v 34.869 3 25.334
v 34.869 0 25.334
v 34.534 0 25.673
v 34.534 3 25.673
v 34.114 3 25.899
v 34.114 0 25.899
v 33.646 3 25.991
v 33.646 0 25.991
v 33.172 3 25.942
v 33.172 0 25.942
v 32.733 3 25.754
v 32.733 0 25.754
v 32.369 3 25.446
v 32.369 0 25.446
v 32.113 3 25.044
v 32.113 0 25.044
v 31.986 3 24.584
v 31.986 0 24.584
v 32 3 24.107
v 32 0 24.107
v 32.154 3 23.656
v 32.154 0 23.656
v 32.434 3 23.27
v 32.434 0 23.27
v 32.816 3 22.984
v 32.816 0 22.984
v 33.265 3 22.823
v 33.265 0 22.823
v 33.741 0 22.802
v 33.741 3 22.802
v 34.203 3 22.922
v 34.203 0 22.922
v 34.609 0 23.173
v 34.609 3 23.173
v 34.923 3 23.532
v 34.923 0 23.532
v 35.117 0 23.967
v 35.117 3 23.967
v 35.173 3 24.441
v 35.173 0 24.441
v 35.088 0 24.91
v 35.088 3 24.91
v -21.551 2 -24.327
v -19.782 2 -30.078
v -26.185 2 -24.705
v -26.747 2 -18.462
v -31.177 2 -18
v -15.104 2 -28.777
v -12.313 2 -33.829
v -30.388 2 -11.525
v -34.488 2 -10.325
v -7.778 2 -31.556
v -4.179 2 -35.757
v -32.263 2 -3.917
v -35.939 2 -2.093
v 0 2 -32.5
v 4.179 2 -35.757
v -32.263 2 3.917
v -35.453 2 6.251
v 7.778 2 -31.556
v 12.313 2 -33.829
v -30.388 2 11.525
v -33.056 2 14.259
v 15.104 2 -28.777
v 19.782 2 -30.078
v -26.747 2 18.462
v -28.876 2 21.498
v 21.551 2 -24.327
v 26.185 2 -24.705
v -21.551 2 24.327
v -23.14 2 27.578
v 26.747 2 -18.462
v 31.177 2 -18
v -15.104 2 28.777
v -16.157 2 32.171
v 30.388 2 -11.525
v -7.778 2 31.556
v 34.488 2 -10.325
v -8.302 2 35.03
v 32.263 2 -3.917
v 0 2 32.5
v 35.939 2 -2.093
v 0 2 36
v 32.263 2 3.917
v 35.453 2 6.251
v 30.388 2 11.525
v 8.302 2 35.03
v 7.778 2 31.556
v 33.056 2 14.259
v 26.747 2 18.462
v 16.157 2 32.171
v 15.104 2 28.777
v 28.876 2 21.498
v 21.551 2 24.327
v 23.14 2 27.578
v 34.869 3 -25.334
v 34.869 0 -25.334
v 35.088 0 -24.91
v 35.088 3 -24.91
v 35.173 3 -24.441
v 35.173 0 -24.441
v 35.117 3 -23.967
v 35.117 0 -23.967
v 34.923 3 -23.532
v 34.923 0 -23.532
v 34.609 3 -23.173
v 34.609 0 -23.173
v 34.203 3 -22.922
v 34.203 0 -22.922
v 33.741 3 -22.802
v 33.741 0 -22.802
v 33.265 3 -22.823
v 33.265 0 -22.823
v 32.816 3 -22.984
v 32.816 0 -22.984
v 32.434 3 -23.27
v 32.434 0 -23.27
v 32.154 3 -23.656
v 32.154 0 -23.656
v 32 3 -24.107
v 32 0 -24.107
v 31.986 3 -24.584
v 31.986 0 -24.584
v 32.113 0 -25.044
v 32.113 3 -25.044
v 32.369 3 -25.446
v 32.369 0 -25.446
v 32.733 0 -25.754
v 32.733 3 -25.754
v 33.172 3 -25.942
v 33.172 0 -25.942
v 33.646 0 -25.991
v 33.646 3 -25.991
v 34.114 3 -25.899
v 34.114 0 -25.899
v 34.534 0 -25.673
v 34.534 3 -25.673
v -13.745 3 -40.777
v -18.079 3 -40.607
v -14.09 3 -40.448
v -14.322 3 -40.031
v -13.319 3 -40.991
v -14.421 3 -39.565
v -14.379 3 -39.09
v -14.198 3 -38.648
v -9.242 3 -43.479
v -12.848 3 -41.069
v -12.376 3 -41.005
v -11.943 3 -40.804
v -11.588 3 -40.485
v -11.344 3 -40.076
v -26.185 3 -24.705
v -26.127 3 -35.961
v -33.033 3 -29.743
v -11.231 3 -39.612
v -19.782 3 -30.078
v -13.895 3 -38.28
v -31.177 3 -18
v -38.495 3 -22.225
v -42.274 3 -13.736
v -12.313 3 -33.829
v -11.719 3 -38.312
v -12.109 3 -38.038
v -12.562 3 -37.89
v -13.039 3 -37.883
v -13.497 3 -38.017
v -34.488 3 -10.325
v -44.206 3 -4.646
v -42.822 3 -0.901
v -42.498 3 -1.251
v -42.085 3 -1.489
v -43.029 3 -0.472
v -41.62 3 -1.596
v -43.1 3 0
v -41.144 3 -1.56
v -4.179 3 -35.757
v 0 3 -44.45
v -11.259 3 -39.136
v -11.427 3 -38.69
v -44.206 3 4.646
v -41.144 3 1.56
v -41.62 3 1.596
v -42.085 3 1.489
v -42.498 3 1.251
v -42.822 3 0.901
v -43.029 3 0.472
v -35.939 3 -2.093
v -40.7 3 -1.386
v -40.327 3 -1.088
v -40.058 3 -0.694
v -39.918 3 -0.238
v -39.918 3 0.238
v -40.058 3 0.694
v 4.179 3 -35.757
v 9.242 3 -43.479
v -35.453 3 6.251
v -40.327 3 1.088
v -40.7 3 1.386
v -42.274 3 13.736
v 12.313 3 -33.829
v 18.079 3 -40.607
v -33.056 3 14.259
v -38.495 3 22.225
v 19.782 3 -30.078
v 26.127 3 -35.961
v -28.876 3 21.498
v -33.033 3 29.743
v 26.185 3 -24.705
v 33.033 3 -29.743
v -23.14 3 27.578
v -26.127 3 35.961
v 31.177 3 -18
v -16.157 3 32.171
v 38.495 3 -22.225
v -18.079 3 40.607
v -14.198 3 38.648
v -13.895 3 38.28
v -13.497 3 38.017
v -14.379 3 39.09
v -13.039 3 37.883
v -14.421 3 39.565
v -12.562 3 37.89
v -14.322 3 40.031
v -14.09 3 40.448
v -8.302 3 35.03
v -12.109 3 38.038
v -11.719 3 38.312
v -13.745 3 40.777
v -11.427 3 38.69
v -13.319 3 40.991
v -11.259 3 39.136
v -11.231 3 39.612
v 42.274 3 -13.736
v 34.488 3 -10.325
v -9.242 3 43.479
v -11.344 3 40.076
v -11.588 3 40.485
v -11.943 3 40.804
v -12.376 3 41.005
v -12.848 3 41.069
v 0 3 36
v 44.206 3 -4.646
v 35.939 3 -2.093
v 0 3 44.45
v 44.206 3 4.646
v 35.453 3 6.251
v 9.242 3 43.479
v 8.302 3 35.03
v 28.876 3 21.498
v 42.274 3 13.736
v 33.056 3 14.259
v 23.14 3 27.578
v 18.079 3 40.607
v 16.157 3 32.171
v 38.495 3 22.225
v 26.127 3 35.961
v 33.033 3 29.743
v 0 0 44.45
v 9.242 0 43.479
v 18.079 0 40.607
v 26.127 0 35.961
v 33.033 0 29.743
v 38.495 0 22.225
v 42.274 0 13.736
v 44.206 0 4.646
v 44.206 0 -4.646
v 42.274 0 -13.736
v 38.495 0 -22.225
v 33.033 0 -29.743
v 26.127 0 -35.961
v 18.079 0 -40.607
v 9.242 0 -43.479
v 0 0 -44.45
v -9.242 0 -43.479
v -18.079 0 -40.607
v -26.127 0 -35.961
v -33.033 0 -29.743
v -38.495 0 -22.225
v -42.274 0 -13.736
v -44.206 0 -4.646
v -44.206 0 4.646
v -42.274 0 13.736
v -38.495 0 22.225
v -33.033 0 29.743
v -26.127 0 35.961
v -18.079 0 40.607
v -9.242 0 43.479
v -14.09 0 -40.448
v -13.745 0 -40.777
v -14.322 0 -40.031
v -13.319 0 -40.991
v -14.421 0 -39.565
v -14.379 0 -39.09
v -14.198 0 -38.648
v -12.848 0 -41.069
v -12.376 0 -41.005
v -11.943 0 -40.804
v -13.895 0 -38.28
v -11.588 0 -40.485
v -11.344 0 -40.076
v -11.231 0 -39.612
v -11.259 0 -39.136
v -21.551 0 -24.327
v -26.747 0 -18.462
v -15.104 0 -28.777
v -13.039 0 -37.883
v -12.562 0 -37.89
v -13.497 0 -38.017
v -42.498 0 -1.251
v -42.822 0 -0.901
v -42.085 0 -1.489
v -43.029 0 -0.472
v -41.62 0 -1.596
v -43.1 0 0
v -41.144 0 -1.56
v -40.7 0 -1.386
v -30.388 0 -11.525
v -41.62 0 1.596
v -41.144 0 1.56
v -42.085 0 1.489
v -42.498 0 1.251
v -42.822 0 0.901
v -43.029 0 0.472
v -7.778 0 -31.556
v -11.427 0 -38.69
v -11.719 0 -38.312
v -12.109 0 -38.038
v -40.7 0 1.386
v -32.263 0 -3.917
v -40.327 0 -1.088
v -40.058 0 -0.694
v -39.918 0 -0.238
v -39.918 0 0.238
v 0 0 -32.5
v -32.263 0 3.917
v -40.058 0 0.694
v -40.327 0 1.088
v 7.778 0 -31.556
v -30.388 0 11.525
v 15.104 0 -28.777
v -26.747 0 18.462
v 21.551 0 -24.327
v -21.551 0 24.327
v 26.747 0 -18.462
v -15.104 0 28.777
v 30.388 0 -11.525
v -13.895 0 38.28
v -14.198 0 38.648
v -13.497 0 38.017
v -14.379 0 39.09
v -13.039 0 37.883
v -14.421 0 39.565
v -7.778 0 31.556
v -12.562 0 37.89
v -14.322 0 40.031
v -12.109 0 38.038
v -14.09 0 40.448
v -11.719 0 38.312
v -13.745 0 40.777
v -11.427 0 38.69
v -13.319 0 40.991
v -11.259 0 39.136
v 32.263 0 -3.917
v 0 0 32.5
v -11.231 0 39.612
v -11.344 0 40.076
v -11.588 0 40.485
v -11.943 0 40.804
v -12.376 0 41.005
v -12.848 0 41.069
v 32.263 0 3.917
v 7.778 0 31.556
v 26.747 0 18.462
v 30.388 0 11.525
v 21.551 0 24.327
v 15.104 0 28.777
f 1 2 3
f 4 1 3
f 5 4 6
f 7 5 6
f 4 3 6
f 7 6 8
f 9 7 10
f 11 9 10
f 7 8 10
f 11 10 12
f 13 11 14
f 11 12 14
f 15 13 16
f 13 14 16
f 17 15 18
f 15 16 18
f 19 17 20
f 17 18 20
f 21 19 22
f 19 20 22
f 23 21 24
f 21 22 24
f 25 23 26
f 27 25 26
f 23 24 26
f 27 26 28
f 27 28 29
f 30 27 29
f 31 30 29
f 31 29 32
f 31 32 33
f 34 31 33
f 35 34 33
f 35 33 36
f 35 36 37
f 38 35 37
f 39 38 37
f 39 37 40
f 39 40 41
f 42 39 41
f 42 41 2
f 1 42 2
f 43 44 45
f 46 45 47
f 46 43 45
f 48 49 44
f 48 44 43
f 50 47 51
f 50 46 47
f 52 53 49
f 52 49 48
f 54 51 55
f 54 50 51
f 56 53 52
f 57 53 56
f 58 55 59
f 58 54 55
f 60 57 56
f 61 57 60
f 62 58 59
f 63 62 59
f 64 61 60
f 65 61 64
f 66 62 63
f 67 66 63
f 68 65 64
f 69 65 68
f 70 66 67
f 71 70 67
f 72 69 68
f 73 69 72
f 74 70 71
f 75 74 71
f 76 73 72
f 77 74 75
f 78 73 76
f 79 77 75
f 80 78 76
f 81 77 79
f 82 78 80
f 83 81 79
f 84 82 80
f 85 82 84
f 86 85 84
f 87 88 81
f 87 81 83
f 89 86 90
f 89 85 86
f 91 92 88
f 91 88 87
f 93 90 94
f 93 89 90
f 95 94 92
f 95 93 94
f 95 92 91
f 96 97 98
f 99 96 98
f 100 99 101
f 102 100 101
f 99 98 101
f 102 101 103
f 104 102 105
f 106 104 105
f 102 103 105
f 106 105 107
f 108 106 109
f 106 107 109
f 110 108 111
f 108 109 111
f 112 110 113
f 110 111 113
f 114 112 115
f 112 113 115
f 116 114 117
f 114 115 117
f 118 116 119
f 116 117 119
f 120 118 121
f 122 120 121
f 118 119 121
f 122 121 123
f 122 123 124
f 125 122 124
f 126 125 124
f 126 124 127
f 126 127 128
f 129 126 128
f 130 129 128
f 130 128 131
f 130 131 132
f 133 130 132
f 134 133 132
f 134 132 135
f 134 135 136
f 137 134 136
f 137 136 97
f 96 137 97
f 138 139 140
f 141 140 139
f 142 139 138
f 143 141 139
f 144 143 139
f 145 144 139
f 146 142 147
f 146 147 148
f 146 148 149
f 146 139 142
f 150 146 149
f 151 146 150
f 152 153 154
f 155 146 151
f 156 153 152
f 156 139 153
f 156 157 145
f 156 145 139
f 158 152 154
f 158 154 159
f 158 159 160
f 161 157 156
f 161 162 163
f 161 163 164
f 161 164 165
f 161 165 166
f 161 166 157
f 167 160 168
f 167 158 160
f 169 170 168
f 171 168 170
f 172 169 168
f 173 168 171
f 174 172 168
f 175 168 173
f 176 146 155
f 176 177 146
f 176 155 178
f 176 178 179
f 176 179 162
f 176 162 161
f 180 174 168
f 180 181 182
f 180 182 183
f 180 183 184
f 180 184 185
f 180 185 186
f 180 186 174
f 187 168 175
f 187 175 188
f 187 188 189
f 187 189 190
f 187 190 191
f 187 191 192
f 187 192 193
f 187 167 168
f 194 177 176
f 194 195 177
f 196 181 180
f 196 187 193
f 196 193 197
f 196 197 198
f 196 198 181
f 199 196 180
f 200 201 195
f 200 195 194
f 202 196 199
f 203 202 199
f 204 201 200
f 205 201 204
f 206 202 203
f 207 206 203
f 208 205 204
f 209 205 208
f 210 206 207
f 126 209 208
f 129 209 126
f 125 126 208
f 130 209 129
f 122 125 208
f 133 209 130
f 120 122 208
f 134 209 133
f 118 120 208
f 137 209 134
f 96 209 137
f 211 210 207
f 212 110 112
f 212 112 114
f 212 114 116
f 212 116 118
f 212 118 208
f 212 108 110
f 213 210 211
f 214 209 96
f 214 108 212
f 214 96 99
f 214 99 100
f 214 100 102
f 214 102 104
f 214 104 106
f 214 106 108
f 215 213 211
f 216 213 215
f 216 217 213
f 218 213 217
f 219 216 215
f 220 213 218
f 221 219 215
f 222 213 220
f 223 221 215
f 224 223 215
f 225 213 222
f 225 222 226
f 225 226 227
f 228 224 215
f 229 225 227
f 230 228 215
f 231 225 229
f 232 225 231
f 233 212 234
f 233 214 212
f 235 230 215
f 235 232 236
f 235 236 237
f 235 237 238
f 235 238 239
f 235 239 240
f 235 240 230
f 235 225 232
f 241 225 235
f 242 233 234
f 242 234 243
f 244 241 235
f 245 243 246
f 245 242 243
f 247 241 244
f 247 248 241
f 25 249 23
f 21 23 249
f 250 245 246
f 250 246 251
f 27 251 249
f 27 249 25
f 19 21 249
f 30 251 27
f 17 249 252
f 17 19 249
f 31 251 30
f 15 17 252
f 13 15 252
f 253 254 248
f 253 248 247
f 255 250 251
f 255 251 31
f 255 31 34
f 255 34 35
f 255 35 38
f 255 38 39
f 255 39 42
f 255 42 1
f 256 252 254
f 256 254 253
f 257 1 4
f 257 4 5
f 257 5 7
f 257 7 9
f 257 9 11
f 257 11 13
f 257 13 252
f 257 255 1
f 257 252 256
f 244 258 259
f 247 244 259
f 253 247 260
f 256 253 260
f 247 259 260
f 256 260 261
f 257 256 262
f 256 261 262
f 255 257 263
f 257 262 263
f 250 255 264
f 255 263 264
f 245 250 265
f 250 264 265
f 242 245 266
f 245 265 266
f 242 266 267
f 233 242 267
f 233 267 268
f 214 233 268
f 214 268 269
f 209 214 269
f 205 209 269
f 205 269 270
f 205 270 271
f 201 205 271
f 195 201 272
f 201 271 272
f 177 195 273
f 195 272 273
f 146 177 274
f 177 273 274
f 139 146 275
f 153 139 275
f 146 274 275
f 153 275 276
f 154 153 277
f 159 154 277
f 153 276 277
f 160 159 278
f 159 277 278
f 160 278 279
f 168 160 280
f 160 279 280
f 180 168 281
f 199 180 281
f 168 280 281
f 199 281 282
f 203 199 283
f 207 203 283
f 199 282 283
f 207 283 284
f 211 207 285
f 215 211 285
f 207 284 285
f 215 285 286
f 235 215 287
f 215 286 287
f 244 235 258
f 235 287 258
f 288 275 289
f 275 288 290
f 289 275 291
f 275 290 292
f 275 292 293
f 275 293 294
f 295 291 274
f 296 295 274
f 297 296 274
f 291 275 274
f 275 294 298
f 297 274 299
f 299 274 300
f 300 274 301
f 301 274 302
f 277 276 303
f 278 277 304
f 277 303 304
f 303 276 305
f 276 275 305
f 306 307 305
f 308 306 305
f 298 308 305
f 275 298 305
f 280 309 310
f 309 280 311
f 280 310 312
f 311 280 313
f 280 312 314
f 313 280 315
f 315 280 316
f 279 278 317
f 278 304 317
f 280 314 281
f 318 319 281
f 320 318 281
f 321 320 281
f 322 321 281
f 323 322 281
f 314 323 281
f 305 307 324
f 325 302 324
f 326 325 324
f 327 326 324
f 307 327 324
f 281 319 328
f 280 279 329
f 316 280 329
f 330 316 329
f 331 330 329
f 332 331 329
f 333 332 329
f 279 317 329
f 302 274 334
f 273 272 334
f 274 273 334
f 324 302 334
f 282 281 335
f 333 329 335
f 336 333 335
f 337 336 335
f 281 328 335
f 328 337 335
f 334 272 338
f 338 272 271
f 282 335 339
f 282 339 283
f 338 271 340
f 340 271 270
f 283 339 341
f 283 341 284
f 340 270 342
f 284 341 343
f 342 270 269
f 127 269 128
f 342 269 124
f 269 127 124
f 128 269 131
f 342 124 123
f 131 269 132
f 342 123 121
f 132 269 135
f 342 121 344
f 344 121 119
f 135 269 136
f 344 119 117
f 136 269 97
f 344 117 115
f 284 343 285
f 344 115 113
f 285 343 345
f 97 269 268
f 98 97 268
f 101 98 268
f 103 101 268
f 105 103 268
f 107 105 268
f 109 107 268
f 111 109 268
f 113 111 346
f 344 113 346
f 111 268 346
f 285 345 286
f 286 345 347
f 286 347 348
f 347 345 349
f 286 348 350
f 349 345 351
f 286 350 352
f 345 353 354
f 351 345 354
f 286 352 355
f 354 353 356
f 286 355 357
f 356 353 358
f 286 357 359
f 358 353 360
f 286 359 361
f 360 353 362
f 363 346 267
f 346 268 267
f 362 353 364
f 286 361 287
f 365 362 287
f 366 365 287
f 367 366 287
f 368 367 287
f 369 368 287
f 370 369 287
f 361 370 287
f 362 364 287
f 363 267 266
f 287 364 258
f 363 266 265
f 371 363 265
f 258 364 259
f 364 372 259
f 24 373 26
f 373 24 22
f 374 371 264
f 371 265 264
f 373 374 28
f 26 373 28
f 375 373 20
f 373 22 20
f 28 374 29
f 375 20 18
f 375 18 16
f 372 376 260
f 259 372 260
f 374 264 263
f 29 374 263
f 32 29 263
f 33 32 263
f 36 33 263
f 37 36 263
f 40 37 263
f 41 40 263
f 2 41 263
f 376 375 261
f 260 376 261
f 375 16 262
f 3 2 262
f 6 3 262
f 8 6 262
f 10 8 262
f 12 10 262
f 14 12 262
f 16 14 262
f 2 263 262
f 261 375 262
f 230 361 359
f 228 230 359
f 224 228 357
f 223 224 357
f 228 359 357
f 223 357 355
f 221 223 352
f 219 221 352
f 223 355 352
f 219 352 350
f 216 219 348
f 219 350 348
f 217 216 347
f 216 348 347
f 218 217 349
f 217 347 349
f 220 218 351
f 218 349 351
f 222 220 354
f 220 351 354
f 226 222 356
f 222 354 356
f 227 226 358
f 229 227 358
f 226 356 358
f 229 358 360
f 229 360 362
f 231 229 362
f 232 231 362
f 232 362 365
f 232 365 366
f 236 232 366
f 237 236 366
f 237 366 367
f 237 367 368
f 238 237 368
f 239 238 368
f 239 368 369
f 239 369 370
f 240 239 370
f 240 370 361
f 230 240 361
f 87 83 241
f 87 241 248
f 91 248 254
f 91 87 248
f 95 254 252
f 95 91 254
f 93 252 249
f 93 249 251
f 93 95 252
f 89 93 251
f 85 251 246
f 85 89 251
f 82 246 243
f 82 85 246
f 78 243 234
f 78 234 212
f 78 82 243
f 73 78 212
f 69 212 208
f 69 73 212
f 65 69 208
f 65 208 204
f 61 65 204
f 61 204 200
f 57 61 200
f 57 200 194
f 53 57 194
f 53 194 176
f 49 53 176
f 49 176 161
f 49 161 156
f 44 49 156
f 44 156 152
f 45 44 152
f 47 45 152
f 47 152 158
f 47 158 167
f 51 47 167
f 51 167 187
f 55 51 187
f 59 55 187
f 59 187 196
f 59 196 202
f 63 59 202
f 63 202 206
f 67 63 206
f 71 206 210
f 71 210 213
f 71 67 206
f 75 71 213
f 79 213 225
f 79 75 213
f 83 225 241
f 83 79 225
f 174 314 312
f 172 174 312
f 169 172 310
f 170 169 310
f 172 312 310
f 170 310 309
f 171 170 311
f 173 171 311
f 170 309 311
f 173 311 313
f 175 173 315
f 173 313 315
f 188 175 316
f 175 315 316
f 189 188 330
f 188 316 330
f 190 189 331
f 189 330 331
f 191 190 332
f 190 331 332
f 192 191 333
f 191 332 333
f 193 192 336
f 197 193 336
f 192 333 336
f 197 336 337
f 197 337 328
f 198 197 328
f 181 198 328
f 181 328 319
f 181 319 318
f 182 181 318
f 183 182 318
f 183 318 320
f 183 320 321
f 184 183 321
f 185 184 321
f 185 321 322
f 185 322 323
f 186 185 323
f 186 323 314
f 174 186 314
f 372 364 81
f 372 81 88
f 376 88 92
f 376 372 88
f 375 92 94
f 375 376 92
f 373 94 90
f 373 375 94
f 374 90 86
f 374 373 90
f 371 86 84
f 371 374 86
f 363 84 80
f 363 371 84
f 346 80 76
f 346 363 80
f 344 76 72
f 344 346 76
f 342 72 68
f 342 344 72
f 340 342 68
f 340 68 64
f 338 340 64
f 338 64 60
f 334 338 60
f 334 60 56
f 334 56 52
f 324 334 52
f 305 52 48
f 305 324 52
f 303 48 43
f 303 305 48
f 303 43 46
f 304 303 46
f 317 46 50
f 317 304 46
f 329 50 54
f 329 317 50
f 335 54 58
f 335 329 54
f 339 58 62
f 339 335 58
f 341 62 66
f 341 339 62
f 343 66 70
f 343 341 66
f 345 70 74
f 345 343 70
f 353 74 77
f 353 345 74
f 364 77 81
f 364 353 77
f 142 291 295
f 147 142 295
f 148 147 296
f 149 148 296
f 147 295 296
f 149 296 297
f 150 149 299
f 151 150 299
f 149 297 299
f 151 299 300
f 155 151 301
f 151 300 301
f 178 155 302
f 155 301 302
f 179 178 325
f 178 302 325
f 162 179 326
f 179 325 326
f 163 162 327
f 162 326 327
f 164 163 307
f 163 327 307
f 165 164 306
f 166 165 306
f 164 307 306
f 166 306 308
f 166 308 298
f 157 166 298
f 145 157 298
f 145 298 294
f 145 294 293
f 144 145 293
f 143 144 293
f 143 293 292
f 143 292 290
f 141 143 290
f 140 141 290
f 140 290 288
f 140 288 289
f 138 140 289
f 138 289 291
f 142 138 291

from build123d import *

# Parameters (mm, degrees)
SKETCH1_R            = 44.45
SKETCH1_R_2          = 36
BOSS_EXTRUDE1_DEPTH  = 3
SKETCH1_3_R          = 36
SKETCH1_3_R_2        = 32.5
BOSS_EXTRUDE2_DEPTH  = 2
M3_CLEARANCE_HOLE1_D = 3.2
CIRPATTERN1_COUNT    = 5


with BuildPart() as part:
    # Sketch1 → Boss-Extrude1 (new body)
    with BuildSketch(Plane(origin=(0, 0, 0), x_dir=(1, 0, 0), z_dir=(0, 1, 0))):
        Circle(SKETCH1_R)
        Circle(SKETCH1_R_2, mode=Mode.SUBTRACT)
    extrude(amount=BOSS_EXTRUDE1_DEPTH)

    # Sketch1<3> → Boss-Extrude2 (add)
    with BuildSketch(Plane(origin=(0, 0, 0), x_dir=(1, 0, 0), z_dir=(0, 1, 0))):
        Circle(SKETCH1_3_R)
        Circle(SKETCH1_3_R_2, mode=Mode.SUBTRACT)
    extrude(amount=BOSS_EXTRUDE2_DEPTH)

    # M3 Clearance Hole1 (through all)
    with Locations(Plane(origin=(0, 3, 0), x_dir=(1, 0, 0), z_dir=(0, 1, 0))):
        with Locations((-41.5, 0)):
            m3_clearance_hole1 = Hole(M3_CLEARANCE_HOLE1_D / 2)

    # CirPattern1: M3 Clearance Hole1 ×5 about axis
    cirpattern1_axis = Axis((0, 3, 0), (0, -1, 0))
    for i in range(1, CIRPATTERN1_COUNT):
        add(m3_clearance_hole1.rotate(cirpattern1_axis, i * 360 / CIRPATTERN1_COUNT), mode=Mode.SUBTRACT)


solid = part.part
